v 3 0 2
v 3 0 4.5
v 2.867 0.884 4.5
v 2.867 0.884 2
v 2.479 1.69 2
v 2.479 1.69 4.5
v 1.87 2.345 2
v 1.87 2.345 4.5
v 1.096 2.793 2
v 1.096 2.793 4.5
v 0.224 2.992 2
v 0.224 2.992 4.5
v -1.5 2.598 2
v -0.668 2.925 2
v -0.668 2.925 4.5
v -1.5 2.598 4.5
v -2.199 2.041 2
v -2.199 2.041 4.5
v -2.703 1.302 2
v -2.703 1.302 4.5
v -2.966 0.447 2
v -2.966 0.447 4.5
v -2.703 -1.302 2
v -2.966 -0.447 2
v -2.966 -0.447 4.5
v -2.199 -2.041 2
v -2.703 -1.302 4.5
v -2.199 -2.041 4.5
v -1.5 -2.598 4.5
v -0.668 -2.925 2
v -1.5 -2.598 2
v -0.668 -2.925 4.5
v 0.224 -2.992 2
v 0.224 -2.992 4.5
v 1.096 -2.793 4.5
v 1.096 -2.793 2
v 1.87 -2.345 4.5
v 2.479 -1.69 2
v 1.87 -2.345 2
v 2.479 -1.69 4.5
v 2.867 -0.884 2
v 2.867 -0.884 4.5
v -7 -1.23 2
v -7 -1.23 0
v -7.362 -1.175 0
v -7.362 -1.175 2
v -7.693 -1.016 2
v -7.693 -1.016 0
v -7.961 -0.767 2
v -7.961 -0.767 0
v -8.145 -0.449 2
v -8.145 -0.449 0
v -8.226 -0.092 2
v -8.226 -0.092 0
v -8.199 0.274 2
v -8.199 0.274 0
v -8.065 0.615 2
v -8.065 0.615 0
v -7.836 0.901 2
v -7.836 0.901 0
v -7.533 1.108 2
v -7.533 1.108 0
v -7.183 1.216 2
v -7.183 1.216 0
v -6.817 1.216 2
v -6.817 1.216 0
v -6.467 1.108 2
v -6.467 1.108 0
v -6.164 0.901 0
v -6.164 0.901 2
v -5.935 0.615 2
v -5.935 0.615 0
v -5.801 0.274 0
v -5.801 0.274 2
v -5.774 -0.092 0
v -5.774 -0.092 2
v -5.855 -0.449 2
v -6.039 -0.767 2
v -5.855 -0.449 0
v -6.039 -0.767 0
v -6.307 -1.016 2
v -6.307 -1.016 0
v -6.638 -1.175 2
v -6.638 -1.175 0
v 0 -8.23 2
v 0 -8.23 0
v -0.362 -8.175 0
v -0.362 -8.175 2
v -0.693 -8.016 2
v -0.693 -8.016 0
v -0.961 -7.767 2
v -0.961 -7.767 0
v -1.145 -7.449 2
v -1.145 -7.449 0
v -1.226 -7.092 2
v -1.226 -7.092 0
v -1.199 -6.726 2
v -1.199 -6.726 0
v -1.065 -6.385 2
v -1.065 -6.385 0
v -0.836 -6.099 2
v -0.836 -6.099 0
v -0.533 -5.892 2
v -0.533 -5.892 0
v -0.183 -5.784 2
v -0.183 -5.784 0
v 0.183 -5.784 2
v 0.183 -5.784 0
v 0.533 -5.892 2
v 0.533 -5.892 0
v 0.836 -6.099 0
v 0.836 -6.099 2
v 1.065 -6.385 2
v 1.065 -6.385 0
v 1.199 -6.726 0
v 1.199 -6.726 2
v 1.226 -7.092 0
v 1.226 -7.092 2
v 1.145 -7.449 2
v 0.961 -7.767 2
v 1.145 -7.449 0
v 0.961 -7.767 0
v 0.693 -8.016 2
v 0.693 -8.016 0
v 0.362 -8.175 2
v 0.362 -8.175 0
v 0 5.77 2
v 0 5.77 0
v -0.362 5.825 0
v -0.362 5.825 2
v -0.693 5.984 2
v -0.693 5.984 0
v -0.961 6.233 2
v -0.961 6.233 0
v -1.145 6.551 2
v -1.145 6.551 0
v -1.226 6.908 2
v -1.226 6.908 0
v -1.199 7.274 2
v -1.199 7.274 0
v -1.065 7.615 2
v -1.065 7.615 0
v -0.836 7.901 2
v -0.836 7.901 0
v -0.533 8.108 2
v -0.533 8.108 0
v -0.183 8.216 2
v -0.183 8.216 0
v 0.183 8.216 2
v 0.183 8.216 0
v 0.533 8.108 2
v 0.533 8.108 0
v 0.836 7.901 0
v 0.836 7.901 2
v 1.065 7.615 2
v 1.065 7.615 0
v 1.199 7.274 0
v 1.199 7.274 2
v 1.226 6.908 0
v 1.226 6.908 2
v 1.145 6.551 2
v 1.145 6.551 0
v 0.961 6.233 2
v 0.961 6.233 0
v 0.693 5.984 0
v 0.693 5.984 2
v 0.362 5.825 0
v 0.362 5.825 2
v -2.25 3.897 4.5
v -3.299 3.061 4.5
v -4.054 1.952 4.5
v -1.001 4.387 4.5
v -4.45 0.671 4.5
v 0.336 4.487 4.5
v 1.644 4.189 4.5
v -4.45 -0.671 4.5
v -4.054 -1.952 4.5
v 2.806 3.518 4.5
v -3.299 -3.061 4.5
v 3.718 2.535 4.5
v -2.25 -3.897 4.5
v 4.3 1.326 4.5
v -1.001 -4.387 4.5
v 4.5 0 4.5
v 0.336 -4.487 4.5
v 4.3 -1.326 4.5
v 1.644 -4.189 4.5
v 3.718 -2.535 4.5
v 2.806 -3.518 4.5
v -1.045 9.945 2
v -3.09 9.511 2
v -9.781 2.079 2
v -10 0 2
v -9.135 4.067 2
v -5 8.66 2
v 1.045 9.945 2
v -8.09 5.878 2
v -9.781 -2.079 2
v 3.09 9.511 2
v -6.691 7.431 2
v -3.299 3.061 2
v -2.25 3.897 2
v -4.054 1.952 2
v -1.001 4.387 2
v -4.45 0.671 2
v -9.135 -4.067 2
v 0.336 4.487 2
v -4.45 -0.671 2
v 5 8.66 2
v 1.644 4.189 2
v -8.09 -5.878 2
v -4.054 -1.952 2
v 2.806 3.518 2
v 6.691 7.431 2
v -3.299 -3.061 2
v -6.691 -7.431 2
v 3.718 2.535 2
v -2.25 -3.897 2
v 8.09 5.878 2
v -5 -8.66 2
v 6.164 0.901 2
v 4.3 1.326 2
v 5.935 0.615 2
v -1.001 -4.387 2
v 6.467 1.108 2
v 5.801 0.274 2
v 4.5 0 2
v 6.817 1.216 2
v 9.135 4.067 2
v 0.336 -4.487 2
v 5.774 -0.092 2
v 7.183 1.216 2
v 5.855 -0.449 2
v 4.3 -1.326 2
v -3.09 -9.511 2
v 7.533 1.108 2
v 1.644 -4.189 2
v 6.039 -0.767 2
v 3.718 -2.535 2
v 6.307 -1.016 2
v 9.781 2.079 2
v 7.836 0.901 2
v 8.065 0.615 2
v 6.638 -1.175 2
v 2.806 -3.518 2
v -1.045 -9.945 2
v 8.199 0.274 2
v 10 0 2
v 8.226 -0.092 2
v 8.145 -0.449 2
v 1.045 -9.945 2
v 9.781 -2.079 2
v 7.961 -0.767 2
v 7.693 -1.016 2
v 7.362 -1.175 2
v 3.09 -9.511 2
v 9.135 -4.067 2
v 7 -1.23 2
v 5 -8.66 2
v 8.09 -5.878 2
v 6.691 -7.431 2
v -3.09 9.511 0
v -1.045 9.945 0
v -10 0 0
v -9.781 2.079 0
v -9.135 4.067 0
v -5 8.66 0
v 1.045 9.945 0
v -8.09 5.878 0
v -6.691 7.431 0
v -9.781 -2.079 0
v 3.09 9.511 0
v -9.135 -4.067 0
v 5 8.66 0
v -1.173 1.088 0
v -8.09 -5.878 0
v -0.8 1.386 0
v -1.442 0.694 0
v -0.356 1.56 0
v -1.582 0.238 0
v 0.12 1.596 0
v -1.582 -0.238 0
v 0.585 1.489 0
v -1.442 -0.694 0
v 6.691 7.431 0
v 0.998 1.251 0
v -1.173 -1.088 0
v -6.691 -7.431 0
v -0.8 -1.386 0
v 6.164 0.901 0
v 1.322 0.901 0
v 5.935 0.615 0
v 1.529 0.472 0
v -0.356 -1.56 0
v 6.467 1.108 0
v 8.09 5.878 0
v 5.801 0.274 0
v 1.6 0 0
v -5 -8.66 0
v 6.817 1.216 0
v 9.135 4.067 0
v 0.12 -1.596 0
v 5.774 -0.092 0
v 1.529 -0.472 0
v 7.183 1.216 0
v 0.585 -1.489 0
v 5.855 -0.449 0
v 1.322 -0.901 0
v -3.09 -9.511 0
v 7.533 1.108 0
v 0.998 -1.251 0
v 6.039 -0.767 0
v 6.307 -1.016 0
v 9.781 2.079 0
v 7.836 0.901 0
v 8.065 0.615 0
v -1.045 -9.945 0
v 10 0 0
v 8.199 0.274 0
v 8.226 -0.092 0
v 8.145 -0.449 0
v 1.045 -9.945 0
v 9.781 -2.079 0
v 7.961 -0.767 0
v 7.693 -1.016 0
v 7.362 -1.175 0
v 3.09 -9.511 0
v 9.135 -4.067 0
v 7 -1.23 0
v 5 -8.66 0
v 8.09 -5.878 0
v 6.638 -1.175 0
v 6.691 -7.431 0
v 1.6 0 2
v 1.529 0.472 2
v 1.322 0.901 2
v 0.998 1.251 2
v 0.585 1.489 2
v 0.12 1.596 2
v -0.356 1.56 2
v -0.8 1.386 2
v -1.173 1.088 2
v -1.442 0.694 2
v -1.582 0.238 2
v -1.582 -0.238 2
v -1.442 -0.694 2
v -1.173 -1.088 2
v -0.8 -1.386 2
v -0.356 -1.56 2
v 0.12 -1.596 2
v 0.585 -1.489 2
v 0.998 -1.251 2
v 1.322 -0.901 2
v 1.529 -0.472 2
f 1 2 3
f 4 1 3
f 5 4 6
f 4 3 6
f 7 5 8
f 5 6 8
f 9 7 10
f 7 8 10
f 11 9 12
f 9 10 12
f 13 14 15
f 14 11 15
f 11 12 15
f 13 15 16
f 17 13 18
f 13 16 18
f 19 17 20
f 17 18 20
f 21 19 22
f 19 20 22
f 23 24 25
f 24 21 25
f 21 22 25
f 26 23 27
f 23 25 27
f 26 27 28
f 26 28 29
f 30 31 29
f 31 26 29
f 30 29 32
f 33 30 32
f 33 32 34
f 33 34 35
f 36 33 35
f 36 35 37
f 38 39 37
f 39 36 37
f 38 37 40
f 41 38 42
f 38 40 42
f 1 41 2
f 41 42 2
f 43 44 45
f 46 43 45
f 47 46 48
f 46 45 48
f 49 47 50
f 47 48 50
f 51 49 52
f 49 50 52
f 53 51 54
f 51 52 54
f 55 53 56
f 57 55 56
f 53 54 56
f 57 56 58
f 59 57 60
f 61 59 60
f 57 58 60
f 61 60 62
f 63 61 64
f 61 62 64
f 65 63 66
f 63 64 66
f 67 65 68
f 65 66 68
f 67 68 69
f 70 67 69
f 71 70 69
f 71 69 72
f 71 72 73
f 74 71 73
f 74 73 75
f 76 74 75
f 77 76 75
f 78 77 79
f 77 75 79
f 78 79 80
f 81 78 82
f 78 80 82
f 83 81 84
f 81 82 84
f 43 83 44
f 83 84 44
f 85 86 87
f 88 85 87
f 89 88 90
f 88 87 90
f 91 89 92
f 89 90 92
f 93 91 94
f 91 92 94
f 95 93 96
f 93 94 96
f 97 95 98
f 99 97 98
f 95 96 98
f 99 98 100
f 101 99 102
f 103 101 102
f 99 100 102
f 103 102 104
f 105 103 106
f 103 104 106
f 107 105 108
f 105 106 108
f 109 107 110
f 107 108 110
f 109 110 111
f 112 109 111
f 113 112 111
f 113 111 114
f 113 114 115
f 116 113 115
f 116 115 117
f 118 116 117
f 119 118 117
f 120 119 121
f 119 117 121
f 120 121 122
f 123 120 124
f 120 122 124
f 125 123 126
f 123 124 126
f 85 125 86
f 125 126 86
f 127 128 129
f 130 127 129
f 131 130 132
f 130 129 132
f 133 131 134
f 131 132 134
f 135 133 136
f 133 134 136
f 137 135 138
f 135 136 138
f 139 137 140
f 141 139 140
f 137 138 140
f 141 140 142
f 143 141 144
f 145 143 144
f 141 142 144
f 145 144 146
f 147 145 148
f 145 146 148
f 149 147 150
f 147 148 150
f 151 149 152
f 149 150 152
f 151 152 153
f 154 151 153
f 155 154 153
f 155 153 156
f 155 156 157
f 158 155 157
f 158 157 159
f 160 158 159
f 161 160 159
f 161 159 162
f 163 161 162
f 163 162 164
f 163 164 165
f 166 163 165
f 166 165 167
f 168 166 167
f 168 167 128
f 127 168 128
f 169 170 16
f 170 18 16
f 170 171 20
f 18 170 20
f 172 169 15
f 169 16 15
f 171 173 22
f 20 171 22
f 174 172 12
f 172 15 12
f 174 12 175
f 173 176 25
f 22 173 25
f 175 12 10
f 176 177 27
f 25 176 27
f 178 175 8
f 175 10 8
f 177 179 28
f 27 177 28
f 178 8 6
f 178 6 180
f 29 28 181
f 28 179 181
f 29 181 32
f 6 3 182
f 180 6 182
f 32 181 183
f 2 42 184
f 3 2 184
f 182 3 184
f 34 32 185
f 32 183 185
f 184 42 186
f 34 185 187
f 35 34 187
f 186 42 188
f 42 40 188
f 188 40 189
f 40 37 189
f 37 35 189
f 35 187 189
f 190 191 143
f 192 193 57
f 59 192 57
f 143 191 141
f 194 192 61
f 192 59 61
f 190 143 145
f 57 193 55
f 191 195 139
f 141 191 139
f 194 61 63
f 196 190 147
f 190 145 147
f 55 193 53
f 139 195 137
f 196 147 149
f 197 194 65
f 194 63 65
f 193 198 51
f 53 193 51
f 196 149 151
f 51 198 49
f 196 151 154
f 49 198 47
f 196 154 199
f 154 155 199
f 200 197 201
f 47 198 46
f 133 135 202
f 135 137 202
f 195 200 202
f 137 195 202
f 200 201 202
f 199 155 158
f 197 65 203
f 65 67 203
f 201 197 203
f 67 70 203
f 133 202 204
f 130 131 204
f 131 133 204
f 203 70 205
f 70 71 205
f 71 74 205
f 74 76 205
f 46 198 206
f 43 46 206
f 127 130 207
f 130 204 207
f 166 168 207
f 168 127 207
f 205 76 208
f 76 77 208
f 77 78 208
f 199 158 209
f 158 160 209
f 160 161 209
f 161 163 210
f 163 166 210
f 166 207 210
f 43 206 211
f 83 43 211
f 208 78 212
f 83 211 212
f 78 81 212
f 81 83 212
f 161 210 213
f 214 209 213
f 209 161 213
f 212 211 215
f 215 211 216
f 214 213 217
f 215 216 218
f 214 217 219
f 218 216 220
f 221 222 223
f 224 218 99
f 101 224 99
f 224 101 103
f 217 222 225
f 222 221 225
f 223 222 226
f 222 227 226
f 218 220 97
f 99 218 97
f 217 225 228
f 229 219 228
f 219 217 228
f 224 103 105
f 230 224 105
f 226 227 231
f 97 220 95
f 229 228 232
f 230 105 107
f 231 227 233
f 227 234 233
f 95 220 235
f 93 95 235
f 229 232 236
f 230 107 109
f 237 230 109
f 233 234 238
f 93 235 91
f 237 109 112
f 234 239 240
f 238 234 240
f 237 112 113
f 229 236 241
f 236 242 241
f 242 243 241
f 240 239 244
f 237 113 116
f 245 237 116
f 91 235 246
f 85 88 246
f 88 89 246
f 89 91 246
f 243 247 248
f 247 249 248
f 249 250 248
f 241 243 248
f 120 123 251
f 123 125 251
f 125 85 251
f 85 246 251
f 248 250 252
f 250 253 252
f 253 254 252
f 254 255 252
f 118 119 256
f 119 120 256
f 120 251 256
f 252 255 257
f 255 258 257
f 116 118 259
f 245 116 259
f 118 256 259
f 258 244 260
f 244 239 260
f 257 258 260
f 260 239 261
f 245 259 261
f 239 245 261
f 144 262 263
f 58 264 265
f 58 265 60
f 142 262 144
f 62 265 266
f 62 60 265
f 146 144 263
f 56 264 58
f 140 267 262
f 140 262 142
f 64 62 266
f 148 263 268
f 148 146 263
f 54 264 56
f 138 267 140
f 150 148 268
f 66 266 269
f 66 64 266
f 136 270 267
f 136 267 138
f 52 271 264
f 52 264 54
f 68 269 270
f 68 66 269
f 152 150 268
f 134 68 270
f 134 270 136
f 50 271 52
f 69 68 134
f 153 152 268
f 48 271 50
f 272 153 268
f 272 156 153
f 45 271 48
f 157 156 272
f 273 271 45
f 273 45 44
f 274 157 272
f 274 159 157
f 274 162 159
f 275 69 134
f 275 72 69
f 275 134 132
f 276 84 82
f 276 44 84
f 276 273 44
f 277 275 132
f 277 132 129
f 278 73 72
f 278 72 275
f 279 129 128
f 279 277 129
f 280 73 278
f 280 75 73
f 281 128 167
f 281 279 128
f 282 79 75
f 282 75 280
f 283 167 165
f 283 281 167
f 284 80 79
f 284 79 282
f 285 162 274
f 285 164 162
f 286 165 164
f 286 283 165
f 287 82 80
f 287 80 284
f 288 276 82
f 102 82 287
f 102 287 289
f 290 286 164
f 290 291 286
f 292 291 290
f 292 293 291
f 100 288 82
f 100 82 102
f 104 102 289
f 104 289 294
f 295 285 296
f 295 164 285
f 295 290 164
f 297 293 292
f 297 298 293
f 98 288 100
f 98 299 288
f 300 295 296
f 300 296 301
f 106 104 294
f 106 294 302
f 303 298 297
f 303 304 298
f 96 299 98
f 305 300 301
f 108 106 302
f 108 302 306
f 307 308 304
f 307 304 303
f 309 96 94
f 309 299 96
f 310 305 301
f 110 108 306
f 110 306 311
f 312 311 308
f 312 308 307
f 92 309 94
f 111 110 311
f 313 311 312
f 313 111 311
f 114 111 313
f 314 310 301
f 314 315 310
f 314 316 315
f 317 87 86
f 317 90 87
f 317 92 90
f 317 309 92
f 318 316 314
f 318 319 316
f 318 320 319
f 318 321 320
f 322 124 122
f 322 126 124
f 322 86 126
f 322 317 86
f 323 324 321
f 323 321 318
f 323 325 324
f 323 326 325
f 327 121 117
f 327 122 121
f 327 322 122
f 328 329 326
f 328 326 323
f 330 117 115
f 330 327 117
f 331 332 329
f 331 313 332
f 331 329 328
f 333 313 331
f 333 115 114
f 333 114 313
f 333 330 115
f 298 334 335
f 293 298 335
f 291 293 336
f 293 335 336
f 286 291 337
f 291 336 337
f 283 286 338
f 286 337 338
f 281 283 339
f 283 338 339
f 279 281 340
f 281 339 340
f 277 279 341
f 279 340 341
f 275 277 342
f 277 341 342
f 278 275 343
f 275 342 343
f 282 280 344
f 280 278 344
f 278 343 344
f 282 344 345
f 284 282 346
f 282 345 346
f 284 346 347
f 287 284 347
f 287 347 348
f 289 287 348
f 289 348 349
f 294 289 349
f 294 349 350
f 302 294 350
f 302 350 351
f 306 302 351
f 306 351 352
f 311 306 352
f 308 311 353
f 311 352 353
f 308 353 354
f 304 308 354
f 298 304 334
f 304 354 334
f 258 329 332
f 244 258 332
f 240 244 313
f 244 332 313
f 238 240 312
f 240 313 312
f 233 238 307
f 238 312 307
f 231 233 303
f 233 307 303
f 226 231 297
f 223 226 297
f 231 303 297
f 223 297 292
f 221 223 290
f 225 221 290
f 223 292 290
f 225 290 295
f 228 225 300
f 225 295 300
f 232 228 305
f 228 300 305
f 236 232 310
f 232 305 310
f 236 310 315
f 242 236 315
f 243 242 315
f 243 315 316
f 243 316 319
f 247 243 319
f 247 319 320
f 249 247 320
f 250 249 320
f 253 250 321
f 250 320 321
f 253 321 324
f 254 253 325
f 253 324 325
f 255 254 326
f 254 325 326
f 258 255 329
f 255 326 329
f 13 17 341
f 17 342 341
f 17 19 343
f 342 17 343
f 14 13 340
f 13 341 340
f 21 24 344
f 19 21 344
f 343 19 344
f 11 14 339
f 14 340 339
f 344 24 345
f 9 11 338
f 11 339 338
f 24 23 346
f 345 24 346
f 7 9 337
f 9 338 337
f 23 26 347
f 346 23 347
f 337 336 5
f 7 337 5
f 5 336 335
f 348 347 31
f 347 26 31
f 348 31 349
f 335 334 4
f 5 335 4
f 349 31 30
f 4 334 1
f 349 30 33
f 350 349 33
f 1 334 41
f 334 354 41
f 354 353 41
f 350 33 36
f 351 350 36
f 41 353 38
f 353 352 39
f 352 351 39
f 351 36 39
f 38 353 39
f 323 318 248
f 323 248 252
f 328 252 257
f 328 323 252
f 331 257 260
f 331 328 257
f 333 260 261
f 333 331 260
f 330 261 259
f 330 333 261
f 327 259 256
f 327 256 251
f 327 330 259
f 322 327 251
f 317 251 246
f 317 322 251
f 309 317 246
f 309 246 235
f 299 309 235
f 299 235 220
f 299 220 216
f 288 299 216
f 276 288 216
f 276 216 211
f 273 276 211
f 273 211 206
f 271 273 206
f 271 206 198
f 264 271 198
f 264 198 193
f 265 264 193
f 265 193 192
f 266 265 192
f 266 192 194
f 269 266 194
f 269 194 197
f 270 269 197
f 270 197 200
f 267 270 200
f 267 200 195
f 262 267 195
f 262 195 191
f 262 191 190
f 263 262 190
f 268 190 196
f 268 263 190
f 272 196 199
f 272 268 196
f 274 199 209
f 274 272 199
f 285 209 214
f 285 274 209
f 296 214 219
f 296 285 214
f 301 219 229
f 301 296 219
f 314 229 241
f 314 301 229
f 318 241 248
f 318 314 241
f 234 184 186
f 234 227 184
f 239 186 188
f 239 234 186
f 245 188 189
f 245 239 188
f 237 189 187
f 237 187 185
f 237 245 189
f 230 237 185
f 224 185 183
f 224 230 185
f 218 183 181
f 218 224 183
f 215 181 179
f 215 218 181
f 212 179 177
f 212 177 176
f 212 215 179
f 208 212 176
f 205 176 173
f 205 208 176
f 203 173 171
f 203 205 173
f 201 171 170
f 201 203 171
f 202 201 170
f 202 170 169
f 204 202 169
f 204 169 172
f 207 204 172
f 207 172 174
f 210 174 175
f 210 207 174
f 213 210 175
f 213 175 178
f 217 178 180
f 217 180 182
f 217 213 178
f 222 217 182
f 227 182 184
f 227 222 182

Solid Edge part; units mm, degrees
sketch "Sketch1" plane through (0, 0, 0) normal (0, -1, 0) x (1, 0, 0)
  line L0 (1.6, 0) -> (1.6, 2)
  line L1 (1.6, 2) -> (3, 2)
  line L2 (3, 2) -> (3, 4.5)
  line L3 (3, 4.5) -> (4.5, 4.5)
  line L4 (4.5, 4.5) -> (4.5, 2)
  line L5 (4.5, 2) -> (10, 2)
  line L6 (10, 2) -> (10, 0)
  line L7 (10, 0) -> (1.6, 0)
  dimension "D1" = 4.5
  dimension "D2" = 2.5
revolve "RevolvedProtrusion1" add sketch "Sketch1" angle 360 about axis through (0, 0, 54) along (0, 0, -1)
hole "Hole_1" at (7, 0, 2) direction (0, 0, -1) diameter 2.459 depth 30 tip angle 118 thread major 3 thread length 2
hole "Hole1" at (0, 7, 2) direction (0, 0, -1) diameter 2.459 depth 30 tip angle 118 thread major 3 thread length 2
hole "Hole2" at (-7, 0, 2) direction (0, 0, -1) diameter 2.459 depth 30 tip angle 118 thread major 3 thread length 2
hole "Hole3" at (0, -7, 2) direction (0, 0, -1) diameter 2.459 depth 30 tip angle 118 thread major 3 thread length 2
properties material "Aluminum, 1060"
